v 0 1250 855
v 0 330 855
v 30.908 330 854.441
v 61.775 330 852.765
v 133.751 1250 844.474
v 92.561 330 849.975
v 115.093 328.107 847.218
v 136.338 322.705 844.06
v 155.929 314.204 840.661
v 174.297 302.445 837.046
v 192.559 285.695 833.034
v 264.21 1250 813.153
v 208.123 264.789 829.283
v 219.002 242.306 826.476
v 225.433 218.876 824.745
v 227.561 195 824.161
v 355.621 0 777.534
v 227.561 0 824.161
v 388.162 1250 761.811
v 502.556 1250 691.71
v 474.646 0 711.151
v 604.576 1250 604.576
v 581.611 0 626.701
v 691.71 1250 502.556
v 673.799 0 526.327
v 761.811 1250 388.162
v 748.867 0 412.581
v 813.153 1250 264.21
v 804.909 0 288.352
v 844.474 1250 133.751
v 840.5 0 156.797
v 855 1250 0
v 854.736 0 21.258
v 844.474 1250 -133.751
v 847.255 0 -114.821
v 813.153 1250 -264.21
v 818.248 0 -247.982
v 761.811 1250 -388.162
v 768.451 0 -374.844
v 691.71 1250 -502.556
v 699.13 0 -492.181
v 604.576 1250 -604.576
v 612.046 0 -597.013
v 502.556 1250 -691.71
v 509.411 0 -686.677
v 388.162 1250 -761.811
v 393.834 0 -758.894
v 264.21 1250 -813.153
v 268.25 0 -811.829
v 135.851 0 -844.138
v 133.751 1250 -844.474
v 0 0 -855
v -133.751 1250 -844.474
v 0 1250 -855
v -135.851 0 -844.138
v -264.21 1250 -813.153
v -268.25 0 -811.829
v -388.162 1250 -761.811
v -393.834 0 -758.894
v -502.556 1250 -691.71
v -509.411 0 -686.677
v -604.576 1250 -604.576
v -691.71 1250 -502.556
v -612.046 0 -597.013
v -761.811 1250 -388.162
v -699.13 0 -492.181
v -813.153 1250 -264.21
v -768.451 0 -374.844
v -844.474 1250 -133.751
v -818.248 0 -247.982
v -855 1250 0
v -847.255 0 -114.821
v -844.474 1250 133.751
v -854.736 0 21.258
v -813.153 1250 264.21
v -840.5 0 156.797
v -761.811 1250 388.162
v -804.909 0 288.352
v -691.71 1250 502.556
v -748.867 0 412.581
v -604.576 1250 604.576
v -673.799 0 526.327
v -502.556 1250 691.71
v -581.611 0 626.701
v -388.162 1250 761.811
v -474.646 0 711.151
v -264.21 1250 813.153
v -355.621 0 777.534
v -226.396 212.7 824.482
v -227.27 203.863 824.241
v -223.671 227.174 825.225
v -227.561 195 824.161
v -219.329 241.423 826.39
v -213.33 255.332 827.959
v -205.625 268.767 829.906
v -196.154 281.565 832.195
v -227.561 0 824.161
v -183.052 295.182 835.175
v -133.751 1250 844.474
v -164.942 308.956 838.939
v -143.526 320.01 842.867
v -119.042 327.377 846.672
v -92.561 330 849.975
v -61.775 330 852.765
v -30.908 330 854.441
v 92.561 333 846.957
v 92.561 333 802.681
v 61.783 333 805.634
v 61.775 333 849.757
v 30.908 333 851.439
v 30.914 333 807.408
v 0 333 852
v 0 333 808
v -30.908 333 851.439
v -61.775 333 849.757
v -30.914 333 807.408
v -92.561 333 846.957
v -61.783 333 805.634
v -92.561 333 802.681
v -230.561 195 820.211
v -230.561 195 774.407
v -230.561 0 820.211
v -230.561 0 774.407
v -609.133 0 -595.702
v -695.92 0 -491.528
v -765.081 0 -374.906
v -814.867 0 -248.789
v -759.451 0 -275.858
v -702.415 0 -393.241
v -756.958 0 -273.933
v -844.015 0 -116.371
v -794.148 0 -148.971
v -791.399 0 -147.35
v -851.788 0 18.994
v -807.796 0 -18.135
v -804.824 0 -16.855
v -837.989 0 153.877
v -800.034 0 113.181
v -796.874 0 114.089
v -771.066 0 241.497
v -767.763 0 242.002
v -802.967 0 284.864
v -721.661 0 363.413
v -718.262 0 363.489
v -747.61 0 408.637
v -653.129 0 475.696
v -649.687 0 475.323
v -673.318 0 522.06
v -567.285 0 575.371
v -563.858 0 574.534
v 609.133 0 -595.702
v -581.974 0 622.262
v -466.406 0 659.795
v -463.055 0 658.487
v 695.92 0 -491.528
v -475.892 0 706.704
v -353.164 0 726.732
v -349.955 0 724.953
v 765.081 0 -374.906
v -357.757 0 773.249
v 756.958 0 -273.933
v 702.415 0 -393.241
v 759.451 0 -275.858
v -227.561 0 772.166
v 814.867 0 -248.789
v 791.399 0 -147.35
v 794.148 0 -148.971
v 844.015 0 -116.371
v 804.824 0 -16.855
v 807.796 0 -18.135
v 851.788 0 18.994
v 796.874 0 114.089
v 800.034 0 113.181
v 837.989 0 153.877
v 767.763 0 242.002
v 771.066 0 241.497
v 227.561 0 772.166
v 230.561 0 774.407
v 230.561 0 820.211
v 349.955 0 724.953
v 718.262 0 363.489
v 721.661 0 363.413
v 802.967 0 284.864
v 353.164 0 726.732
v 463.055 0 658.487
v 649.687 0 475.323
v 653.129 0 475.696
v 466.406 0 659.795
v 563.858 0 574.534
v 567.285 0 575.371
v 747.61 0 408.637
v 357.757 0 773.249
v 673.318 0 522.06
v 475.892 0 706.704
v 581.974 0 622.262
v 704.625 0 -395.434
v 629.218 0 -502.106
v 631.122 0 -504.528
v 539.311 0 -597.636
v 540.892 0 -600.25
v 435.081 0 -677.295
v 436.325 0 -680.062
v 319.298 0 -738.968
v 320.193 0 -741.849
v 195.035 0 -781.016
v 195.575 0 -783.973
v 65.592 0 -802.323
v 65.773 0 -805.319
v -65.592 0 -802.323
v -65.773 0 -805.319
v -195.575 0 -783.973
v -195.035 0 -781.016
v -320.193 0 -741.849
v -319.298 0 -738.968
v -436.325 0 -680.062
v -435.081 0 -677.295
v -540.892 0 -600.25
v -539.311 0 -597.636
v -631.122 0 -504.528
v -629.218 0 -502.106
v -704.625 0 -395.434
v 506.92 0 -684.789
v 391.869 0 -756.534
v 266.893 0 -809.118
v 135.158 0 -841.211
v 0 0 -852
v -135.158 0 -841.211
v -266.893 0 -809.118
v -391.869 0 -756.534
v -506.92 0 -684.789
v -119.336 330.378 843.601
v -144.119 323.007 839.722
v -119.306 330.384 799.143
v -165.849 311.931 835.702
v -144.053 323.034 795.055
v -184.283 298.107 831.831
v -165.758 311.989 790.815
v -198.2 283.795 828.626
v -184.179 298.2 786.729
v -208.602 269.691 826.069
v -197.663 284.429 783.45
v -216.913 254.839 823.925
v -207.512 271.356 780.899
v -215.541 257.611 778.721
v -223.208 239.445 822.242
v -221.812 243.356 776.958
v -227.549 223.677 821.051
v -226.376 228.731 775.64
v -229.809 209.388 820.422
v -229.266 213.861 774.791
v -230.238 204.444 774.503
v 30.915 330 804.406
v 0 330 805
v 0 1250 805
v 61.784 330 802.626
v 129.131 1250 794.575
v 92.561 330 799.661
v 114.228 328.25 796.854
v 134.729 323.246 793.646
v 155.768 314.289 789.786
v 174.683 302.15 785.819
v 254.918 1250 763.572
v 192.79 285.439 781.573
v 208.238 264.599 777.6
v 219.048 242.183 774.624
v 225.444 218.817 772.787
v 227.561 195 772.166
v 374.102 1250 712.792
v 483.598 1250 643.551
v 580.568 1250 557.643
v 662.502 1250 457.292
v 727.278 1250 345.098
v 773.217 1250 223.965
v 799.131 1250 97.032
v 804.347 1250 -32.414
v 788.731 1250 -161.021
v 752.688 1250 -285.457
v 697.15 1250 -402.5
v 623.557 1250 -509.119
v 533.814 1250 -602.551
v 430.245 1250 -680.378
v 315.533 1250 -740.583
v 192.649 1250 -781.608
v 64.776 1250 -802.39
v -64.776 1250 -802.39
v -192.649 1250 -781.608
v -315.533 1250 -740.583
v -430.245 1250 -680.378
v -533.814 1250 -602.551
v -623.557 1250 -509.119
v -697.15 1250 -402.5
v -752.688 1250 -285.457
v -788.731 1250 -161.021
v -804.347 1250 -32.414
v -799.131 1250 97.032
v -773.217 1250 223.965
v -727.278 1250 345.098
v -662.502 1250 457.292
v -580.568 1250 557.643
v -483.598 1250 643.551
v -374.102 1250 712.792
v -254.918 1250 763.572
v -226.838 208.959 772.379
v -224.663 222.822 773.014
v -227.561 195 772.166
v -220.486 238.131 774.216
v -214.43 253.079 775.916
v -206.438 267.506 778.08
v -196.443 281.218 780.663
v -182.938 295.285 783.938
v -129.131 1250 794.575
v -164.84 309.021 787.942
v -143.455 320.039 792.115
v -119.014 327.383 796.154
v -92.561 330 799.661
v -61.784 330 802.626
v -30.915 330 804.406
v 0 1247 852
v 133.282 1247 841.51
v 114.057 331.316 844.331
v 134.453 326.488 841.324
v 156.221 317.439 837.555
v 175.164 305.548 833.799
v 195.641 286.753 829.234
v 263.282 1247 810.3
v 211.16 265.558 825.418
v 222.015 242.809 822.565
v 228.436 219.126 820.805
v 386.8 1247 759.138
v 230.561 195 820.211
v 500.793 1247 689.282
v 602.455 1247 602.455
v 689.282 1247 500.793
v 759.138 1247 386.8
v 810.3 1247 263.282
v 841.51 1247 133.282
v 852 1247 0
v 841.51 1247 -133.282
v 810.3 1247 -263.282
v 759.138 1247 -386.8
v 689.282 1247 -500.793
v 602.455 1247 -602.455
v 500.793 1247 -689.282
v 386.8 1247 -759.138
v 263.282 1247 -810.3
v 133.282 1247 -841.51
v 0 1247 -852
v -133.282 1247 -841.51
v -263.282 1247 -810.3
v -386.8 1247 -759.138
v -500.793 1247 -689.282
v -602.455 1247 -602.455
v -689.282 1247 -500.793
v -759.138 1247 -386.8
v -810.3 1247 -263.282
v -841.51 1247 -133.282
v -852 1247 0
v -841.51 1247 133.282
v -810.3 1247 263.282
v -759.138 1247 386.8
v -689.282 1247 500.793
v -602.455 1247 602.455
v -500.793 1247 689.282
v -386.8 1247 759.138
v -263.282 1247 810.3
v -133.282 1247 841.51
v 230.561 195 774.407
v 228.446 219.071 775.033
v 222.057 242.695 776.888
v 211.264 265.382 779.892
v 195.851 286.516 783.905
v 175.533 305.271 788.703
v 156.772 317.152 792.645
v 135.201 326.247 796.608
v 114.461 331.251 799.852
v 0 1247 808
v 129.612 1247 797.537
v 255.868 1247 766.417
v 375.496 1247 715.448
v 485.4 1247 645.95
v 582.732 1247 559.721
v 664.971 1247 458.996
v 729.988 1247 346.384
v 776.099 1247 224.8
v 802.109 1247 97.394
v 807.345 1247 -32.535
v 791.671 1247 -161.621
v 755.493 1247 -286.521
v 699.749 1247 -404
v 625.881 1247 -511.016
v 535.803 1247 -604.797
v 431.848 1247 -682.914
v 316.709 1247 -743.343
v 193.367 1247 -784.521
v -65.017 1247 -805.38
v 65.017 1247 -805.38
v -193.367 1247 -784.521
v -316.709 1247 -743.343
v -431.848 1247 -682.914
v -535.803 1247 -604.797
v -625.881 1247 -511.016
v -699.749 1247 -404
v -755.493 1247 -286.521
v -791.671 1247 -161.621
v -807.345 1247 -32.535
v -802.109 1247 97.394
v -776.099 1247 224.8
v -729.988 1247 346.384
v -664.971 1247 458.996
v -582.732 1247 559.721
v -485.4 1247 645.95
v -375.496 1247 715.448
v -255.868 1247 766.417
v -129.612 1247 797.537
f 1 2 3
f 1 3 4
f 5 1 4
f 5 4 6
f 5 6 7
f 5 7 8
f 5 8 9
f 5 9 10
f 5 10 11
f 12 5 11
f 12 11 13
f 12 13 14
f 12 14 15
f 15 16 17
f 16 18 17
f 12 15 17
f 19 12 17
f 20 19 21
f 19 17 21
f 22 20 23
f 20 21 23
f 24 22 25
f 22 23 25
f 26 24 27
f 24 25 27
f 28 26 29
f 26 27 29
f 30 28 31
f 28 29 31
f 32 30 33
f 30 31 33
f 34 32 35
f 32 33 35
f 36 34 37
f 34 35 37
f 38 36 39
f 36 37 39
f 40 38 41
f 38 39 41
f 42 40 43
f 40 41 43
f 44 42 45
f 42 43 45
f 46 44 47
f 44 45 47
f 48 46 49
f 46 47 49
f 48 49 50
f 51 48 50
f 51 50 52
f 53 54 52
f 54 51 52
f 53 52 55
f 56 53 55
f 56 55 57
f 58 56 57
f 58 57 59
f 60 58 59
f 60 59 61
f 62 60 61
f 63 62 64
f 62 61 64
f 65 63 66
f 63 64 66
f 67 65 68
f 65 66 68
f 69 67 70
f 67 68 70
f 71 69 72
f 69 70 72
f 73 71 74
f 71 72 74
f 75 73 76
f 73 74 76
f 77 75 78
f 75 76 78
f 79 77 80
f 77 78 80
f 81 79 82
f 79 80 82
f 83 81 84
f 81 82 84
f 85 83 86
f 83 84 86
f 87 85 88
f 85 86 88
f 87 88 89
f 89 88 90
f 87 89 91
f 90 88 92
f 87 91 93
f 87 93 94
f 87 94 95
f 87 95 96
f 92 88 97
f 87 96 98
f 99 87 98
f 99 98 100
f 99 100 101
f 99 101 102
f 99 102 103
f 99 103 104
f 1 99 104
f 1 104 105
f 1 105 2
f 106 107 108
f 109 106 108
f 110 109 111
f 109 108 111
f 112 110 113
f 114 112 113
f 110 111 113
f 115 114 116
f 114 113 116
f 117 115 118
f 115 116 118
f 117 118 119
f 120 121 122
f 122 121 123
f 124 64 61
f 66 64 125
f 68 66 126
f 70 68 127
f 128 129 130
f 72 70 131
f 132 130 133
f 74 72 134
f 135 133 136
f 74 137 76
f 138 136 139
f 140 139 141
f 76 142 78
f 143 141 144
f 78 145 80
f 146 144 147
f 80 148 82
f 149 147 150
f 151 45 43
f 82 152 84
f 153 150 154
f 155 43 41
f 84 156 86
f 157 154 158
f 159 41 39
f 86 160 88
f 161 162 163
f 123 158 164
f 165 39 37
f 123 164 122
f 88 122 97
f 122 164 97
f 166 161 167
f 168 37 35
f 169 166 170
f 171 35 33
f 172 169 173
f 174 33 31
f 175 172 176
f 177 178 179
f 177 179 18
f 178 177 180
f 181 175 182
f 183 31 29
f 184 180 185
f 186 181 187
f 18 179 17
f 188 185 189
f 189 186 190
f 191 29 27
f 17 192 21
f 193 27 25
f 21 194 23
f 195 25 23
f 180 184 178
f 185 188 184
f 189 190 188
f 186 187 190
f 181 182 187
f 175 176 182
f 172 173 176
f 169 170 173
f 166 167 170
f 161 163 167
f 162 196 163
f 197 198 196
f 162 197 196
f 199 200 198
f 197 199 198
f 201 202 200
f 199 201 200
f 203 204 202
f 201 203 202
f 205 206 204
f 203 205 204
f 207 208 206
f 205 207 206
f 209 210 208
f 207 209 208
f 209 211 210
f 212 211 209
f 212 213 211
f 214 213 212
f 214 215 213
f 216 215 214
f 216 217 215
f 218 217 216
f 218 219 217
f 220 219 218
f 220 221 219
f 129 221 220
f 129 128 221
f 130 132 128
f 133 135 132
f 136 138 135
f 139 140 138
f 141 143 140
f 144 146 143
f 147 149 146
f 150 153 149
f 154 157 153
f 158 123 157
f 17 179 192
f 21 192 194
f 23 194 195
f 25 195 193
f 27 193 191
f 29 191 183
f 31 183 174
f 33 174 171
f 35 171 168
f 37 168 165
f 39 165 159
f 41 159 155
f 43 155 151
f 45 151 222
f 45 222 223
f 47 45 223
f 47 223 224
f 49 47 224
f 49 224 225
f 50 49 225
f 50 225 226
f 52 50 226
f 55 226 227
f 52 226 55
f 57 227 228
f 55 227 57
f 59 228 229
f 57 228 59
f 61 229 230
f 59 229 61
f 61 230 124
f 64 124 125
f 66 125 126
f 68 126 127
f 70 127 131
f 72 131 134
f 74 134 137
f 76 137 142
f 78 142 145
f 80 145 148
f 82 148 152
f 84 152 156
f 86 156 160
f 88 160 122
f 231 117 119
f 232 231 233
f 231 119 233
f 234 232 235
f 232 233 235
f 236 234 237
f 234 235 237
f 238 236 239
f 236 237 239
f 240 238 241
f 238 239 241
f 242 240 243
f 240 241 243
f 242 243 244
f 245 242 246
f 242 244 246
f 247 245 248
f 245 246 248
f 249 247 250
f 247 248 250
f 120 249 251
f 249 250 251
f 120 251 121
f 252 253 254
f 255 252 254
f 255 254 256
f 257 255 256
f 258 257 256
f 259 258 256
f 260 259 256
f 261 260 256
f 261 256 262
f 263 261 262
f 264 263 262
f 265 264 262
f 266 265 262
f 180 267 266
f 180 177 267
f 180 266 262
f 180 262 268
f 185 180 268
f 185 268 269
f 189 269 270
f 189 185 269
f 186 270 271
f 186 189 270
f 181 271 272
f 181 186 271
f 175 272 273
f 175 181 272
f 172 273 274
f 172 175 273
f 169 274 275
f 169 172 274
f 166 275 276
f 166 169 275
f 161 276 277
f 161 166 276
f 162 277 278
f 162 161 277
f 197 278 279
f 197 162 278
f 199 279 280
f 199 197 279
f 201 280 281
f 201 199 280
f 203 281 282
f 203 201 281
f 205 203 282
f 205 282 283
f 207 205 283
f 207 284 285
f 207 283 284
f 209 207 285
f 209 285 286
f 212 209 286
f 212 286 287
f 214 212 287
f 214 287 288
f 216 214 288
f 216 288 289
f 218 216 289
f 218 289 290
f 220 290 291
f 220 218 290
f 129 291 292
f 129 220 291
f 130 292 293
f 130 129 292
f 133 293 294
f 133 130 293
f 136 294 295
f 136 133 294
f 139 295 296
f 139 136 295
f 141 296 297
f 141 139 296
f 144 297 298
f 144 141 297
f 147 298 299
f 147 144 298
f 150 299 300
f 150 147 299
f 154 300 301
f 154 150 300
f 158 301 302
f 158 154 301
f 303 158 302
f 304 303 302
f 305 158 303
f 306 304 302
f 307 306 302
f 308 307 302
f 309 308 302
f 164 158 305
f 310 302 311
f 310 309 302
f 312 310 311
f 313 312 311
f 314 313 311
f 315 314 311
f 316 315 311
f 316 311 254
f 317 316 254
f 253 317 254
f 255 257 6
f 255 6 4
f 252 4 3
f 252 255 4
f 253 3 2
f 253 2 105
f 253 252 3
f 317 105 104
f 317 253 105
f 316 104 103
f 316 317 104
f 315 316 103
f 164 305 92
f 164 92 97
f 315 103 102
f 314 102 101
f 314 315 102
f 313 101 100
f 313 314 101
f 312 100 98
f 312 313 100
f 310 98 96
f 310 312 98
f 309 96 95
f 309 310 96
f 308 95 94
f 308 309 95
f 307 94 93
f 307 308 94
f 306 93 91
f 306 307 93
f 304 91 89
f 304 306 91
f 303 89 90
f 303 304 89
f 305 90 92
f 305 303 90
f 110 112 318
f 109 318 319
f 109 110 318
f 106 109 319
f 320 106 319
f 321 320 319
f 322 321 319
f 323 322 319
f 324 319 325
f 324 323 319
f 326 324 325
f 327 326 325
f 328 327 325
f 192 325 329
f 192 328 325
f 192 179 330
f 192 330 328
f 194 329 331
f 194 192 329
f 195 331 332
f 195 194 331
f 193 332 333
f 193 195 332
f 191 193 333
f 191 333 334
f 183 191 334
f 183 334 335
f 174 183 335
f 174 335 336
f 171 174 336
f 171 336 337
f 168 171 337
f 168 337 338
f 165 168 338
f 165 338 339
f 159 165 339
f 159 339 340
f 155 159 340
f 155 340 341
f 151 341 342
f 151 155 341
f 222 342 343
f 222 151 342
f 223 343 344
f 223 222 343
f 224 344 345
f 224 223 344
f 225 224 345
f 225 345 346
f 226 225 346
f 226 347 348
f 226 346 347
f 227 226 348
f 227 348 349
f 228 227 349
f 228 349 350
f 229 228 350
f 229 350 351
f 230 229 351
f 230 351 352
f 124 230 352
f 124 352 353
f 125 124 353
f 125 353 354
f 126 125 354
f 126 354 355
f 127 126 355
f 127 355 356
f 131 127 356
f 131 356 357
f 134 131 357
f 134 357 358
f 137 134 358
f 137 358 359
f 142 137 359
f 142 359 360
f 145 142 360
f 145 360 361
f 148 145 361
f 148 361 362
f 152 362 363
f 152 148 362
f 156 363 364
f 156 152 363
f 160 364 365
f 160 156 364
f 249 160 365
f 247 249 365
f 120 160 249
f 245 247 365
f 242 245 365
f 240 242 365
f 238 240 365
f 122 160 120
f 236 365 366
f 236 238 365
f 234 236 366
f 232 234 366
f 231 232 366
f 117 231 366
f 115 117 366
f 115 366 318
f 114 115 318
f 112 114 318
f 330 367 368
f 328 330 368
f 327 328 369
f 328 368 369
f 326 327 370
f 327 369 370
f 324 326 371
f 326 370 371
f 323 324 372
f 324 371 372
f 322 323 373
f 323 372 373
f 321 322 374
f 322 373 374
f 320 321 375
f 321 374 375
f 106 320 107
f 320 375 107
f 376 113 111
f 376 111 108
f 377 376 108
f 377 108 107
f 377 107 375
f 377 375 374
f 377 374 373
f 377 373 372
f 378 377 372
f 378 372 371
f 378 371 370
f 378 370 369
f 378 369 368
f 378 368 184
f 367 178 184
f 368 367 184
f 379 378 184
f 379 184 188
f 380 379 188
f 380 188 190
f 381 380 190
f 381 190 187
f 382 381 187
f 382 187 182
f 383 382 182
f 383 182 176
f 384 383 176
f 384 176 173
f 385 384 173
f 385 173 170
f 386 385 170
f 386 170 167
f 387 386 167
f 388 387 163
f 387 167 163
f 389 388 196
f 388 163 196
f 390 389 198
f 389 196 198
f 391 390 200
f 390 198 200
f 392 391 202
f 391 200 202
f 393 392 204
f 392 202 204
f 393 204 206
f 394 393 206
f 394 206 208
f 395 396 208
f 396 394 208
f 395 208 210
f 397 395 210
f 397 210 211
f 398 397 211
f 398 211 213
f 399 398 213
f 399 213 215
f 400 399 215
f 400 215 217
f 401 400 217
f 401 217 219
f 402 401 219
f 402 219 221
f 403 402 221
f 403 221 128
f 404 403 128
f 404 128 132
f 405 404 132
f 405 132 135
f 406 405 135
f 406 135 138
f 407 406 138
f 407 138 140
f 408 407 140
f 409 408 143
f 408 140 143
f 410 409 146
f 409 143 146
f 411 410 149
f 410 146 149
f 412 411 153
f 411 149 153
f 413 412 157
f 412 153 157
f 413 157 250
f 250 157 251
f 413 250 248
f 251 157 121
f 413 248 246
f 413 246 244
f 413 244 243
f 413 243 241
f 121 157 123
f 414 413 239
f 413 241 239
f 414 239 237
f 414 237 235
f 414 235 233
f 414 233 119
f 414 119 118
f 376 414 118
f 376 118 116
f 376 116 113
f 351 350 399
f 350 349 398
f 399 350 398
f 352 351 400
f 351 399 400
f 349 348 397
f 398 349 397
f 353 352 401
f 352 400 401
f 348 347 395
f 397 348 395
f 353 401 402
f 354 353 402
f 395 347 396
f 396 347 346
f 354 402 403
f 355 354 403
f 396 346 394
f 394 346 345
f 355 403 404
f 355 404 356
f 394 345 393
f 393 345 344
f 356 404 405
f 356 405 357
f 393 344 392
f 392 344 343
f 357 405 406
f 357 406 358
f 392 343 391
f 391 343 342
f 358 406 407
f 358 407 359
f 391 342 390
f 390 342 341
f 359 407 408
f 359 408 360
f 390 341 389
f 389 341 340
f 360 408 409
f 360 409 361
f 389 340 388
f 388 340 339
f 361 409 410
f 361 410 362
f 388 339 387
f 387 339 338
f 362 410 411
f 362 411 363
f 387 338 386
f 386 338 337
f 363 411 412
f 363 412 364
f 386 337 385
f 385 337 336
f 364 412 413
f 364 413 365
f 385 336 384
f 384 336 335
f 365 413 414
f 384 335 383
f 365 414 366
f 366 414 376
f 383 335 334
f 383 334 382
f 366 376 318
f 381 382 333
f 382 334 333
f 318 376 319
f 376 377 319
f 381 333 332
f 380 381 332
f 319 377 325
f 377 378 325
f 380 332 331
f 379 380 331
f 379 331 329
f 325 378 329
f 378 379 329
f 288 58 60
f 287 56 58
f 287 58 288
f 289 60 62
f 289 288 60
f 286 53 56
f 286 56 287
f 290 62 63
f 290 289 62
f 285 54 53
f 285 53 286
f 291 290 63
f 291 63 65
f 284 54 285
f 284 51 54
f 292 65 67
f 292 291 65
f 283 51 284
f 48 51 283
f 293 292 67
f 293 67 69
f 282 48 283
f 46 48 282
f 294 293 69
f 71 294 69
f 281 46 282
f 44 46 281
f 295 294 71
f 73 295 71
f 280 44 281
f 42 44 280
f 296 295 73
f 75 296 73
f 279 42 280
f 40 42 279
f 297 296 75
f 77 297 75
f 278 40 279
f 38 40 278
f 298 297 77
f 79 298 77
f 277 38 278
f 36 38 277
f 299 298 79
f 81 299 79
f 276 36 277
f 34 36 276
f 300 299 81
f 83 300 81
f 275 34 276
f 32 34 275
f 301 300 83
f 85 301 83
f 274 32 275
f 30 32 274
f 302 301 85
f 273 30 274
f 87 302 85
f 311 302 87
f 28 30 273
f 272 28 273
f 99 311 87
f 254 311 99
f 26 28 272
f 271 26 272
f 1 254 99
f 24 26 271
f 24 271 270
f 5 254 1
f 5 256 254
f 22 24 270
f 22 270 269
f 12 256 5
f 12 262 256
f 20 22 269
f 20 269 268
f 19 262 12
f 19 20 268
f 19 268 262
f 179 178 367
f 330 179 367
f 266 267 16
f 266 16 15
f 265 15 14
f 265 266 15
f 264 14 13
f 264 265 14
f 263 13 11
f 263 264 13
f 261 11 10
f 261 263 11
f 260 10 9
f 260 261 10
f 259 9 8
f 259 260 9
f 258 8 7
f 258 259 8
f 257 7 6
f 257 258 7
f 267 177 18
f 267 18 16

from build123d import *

# Parameters (mm, degrees)
SKETCH1_R           = 855
SKETCH1_R_2         = 805
BOSS_EXTRUDE1_DEPTH = 1300
CUT_EXTRUDE1_DEPTH  = 2646
CUT_EXTRUDE2_START  = -50
SKETCH3_R           = 855
CUT_EXTRUDE2_DEPTH  = 50
SHELL1_T            = -3


with BuildPart() as part:
    # Sketch1 → Boss-Extrude1 (new body)
    with BuildSketch(Plane(origin=(0, 0, 0), x_dir=(1, 0, 0), z_dir=(0, 1, 0))):
        with Locations(Location((0, 0, 0), (0, 0, 270))):
            Circle(SKETCH1_R)
        with Locations(Location((0, 0, 0), (0, 0, 270))):
            Circle(SKETCH1_R_2, mode=Mode.SUBTRACT)
    extrude(amount=BOSS_EXTRUDE1_DEPTH)

    # Sketch2 → Cut-Extrude1 (cut)
    with BuildSketch(Plane.XY):
        with BuildLine():
            Line((92.561405604, 330), (-92.561405604, 330))
            ThreePointArc((-92.561405604, 330), (-188.020821064, 290.45941546), (-227.561405604, 195))
            Line((-227.561405604, 195), (-227.561405604, -45))
            ThreePointArc((-227.561405604, -45), (-188.020821064, -140.45941546), (-92.561405604, -180))
            Line((-92.561405604, -180), (92.561405604, -180))
            ThreePointArc((92.561405604, -180), (188.020821064, -140.45941546), (227.561405604, -45))
            Line((227.561405604, -45), (227.561405604, 195))
            ThreePointArc((227.561405604, 195), (188.020821064, 290.45941546), (92.561405604, 330))
        make_face()
    extrude(amount=CUT_EXTRUDE1_DEPTH, mode=Mode.SUBTRACT)

    # Sketch3 → Cut-Extrude2 (cut)
    with BuildSketch(Plane(origin=(0, 1300, 0), x_dir=(1, 0, 0), z_dir=(0, 1, 0)).offset(CUT_EXTRUDE2_START)):
        with Locations(Location((0, 0, 0), (0, 0, 254.56448344))):
            Circle(SKETCH3_R)
    extrude(amount=CUT_EXTRUDE2_DEPTH, mode=Mode.SUBTRACT)

    # Shell1
    shell1_openings = [part.faces().sort_by_distance(p)[0] for p in [
        (251.527382632, 0, 798.163487829),
    ]]
    offset(amount=SHELL1_T, openings=shell1_openings)


solid = part.part
